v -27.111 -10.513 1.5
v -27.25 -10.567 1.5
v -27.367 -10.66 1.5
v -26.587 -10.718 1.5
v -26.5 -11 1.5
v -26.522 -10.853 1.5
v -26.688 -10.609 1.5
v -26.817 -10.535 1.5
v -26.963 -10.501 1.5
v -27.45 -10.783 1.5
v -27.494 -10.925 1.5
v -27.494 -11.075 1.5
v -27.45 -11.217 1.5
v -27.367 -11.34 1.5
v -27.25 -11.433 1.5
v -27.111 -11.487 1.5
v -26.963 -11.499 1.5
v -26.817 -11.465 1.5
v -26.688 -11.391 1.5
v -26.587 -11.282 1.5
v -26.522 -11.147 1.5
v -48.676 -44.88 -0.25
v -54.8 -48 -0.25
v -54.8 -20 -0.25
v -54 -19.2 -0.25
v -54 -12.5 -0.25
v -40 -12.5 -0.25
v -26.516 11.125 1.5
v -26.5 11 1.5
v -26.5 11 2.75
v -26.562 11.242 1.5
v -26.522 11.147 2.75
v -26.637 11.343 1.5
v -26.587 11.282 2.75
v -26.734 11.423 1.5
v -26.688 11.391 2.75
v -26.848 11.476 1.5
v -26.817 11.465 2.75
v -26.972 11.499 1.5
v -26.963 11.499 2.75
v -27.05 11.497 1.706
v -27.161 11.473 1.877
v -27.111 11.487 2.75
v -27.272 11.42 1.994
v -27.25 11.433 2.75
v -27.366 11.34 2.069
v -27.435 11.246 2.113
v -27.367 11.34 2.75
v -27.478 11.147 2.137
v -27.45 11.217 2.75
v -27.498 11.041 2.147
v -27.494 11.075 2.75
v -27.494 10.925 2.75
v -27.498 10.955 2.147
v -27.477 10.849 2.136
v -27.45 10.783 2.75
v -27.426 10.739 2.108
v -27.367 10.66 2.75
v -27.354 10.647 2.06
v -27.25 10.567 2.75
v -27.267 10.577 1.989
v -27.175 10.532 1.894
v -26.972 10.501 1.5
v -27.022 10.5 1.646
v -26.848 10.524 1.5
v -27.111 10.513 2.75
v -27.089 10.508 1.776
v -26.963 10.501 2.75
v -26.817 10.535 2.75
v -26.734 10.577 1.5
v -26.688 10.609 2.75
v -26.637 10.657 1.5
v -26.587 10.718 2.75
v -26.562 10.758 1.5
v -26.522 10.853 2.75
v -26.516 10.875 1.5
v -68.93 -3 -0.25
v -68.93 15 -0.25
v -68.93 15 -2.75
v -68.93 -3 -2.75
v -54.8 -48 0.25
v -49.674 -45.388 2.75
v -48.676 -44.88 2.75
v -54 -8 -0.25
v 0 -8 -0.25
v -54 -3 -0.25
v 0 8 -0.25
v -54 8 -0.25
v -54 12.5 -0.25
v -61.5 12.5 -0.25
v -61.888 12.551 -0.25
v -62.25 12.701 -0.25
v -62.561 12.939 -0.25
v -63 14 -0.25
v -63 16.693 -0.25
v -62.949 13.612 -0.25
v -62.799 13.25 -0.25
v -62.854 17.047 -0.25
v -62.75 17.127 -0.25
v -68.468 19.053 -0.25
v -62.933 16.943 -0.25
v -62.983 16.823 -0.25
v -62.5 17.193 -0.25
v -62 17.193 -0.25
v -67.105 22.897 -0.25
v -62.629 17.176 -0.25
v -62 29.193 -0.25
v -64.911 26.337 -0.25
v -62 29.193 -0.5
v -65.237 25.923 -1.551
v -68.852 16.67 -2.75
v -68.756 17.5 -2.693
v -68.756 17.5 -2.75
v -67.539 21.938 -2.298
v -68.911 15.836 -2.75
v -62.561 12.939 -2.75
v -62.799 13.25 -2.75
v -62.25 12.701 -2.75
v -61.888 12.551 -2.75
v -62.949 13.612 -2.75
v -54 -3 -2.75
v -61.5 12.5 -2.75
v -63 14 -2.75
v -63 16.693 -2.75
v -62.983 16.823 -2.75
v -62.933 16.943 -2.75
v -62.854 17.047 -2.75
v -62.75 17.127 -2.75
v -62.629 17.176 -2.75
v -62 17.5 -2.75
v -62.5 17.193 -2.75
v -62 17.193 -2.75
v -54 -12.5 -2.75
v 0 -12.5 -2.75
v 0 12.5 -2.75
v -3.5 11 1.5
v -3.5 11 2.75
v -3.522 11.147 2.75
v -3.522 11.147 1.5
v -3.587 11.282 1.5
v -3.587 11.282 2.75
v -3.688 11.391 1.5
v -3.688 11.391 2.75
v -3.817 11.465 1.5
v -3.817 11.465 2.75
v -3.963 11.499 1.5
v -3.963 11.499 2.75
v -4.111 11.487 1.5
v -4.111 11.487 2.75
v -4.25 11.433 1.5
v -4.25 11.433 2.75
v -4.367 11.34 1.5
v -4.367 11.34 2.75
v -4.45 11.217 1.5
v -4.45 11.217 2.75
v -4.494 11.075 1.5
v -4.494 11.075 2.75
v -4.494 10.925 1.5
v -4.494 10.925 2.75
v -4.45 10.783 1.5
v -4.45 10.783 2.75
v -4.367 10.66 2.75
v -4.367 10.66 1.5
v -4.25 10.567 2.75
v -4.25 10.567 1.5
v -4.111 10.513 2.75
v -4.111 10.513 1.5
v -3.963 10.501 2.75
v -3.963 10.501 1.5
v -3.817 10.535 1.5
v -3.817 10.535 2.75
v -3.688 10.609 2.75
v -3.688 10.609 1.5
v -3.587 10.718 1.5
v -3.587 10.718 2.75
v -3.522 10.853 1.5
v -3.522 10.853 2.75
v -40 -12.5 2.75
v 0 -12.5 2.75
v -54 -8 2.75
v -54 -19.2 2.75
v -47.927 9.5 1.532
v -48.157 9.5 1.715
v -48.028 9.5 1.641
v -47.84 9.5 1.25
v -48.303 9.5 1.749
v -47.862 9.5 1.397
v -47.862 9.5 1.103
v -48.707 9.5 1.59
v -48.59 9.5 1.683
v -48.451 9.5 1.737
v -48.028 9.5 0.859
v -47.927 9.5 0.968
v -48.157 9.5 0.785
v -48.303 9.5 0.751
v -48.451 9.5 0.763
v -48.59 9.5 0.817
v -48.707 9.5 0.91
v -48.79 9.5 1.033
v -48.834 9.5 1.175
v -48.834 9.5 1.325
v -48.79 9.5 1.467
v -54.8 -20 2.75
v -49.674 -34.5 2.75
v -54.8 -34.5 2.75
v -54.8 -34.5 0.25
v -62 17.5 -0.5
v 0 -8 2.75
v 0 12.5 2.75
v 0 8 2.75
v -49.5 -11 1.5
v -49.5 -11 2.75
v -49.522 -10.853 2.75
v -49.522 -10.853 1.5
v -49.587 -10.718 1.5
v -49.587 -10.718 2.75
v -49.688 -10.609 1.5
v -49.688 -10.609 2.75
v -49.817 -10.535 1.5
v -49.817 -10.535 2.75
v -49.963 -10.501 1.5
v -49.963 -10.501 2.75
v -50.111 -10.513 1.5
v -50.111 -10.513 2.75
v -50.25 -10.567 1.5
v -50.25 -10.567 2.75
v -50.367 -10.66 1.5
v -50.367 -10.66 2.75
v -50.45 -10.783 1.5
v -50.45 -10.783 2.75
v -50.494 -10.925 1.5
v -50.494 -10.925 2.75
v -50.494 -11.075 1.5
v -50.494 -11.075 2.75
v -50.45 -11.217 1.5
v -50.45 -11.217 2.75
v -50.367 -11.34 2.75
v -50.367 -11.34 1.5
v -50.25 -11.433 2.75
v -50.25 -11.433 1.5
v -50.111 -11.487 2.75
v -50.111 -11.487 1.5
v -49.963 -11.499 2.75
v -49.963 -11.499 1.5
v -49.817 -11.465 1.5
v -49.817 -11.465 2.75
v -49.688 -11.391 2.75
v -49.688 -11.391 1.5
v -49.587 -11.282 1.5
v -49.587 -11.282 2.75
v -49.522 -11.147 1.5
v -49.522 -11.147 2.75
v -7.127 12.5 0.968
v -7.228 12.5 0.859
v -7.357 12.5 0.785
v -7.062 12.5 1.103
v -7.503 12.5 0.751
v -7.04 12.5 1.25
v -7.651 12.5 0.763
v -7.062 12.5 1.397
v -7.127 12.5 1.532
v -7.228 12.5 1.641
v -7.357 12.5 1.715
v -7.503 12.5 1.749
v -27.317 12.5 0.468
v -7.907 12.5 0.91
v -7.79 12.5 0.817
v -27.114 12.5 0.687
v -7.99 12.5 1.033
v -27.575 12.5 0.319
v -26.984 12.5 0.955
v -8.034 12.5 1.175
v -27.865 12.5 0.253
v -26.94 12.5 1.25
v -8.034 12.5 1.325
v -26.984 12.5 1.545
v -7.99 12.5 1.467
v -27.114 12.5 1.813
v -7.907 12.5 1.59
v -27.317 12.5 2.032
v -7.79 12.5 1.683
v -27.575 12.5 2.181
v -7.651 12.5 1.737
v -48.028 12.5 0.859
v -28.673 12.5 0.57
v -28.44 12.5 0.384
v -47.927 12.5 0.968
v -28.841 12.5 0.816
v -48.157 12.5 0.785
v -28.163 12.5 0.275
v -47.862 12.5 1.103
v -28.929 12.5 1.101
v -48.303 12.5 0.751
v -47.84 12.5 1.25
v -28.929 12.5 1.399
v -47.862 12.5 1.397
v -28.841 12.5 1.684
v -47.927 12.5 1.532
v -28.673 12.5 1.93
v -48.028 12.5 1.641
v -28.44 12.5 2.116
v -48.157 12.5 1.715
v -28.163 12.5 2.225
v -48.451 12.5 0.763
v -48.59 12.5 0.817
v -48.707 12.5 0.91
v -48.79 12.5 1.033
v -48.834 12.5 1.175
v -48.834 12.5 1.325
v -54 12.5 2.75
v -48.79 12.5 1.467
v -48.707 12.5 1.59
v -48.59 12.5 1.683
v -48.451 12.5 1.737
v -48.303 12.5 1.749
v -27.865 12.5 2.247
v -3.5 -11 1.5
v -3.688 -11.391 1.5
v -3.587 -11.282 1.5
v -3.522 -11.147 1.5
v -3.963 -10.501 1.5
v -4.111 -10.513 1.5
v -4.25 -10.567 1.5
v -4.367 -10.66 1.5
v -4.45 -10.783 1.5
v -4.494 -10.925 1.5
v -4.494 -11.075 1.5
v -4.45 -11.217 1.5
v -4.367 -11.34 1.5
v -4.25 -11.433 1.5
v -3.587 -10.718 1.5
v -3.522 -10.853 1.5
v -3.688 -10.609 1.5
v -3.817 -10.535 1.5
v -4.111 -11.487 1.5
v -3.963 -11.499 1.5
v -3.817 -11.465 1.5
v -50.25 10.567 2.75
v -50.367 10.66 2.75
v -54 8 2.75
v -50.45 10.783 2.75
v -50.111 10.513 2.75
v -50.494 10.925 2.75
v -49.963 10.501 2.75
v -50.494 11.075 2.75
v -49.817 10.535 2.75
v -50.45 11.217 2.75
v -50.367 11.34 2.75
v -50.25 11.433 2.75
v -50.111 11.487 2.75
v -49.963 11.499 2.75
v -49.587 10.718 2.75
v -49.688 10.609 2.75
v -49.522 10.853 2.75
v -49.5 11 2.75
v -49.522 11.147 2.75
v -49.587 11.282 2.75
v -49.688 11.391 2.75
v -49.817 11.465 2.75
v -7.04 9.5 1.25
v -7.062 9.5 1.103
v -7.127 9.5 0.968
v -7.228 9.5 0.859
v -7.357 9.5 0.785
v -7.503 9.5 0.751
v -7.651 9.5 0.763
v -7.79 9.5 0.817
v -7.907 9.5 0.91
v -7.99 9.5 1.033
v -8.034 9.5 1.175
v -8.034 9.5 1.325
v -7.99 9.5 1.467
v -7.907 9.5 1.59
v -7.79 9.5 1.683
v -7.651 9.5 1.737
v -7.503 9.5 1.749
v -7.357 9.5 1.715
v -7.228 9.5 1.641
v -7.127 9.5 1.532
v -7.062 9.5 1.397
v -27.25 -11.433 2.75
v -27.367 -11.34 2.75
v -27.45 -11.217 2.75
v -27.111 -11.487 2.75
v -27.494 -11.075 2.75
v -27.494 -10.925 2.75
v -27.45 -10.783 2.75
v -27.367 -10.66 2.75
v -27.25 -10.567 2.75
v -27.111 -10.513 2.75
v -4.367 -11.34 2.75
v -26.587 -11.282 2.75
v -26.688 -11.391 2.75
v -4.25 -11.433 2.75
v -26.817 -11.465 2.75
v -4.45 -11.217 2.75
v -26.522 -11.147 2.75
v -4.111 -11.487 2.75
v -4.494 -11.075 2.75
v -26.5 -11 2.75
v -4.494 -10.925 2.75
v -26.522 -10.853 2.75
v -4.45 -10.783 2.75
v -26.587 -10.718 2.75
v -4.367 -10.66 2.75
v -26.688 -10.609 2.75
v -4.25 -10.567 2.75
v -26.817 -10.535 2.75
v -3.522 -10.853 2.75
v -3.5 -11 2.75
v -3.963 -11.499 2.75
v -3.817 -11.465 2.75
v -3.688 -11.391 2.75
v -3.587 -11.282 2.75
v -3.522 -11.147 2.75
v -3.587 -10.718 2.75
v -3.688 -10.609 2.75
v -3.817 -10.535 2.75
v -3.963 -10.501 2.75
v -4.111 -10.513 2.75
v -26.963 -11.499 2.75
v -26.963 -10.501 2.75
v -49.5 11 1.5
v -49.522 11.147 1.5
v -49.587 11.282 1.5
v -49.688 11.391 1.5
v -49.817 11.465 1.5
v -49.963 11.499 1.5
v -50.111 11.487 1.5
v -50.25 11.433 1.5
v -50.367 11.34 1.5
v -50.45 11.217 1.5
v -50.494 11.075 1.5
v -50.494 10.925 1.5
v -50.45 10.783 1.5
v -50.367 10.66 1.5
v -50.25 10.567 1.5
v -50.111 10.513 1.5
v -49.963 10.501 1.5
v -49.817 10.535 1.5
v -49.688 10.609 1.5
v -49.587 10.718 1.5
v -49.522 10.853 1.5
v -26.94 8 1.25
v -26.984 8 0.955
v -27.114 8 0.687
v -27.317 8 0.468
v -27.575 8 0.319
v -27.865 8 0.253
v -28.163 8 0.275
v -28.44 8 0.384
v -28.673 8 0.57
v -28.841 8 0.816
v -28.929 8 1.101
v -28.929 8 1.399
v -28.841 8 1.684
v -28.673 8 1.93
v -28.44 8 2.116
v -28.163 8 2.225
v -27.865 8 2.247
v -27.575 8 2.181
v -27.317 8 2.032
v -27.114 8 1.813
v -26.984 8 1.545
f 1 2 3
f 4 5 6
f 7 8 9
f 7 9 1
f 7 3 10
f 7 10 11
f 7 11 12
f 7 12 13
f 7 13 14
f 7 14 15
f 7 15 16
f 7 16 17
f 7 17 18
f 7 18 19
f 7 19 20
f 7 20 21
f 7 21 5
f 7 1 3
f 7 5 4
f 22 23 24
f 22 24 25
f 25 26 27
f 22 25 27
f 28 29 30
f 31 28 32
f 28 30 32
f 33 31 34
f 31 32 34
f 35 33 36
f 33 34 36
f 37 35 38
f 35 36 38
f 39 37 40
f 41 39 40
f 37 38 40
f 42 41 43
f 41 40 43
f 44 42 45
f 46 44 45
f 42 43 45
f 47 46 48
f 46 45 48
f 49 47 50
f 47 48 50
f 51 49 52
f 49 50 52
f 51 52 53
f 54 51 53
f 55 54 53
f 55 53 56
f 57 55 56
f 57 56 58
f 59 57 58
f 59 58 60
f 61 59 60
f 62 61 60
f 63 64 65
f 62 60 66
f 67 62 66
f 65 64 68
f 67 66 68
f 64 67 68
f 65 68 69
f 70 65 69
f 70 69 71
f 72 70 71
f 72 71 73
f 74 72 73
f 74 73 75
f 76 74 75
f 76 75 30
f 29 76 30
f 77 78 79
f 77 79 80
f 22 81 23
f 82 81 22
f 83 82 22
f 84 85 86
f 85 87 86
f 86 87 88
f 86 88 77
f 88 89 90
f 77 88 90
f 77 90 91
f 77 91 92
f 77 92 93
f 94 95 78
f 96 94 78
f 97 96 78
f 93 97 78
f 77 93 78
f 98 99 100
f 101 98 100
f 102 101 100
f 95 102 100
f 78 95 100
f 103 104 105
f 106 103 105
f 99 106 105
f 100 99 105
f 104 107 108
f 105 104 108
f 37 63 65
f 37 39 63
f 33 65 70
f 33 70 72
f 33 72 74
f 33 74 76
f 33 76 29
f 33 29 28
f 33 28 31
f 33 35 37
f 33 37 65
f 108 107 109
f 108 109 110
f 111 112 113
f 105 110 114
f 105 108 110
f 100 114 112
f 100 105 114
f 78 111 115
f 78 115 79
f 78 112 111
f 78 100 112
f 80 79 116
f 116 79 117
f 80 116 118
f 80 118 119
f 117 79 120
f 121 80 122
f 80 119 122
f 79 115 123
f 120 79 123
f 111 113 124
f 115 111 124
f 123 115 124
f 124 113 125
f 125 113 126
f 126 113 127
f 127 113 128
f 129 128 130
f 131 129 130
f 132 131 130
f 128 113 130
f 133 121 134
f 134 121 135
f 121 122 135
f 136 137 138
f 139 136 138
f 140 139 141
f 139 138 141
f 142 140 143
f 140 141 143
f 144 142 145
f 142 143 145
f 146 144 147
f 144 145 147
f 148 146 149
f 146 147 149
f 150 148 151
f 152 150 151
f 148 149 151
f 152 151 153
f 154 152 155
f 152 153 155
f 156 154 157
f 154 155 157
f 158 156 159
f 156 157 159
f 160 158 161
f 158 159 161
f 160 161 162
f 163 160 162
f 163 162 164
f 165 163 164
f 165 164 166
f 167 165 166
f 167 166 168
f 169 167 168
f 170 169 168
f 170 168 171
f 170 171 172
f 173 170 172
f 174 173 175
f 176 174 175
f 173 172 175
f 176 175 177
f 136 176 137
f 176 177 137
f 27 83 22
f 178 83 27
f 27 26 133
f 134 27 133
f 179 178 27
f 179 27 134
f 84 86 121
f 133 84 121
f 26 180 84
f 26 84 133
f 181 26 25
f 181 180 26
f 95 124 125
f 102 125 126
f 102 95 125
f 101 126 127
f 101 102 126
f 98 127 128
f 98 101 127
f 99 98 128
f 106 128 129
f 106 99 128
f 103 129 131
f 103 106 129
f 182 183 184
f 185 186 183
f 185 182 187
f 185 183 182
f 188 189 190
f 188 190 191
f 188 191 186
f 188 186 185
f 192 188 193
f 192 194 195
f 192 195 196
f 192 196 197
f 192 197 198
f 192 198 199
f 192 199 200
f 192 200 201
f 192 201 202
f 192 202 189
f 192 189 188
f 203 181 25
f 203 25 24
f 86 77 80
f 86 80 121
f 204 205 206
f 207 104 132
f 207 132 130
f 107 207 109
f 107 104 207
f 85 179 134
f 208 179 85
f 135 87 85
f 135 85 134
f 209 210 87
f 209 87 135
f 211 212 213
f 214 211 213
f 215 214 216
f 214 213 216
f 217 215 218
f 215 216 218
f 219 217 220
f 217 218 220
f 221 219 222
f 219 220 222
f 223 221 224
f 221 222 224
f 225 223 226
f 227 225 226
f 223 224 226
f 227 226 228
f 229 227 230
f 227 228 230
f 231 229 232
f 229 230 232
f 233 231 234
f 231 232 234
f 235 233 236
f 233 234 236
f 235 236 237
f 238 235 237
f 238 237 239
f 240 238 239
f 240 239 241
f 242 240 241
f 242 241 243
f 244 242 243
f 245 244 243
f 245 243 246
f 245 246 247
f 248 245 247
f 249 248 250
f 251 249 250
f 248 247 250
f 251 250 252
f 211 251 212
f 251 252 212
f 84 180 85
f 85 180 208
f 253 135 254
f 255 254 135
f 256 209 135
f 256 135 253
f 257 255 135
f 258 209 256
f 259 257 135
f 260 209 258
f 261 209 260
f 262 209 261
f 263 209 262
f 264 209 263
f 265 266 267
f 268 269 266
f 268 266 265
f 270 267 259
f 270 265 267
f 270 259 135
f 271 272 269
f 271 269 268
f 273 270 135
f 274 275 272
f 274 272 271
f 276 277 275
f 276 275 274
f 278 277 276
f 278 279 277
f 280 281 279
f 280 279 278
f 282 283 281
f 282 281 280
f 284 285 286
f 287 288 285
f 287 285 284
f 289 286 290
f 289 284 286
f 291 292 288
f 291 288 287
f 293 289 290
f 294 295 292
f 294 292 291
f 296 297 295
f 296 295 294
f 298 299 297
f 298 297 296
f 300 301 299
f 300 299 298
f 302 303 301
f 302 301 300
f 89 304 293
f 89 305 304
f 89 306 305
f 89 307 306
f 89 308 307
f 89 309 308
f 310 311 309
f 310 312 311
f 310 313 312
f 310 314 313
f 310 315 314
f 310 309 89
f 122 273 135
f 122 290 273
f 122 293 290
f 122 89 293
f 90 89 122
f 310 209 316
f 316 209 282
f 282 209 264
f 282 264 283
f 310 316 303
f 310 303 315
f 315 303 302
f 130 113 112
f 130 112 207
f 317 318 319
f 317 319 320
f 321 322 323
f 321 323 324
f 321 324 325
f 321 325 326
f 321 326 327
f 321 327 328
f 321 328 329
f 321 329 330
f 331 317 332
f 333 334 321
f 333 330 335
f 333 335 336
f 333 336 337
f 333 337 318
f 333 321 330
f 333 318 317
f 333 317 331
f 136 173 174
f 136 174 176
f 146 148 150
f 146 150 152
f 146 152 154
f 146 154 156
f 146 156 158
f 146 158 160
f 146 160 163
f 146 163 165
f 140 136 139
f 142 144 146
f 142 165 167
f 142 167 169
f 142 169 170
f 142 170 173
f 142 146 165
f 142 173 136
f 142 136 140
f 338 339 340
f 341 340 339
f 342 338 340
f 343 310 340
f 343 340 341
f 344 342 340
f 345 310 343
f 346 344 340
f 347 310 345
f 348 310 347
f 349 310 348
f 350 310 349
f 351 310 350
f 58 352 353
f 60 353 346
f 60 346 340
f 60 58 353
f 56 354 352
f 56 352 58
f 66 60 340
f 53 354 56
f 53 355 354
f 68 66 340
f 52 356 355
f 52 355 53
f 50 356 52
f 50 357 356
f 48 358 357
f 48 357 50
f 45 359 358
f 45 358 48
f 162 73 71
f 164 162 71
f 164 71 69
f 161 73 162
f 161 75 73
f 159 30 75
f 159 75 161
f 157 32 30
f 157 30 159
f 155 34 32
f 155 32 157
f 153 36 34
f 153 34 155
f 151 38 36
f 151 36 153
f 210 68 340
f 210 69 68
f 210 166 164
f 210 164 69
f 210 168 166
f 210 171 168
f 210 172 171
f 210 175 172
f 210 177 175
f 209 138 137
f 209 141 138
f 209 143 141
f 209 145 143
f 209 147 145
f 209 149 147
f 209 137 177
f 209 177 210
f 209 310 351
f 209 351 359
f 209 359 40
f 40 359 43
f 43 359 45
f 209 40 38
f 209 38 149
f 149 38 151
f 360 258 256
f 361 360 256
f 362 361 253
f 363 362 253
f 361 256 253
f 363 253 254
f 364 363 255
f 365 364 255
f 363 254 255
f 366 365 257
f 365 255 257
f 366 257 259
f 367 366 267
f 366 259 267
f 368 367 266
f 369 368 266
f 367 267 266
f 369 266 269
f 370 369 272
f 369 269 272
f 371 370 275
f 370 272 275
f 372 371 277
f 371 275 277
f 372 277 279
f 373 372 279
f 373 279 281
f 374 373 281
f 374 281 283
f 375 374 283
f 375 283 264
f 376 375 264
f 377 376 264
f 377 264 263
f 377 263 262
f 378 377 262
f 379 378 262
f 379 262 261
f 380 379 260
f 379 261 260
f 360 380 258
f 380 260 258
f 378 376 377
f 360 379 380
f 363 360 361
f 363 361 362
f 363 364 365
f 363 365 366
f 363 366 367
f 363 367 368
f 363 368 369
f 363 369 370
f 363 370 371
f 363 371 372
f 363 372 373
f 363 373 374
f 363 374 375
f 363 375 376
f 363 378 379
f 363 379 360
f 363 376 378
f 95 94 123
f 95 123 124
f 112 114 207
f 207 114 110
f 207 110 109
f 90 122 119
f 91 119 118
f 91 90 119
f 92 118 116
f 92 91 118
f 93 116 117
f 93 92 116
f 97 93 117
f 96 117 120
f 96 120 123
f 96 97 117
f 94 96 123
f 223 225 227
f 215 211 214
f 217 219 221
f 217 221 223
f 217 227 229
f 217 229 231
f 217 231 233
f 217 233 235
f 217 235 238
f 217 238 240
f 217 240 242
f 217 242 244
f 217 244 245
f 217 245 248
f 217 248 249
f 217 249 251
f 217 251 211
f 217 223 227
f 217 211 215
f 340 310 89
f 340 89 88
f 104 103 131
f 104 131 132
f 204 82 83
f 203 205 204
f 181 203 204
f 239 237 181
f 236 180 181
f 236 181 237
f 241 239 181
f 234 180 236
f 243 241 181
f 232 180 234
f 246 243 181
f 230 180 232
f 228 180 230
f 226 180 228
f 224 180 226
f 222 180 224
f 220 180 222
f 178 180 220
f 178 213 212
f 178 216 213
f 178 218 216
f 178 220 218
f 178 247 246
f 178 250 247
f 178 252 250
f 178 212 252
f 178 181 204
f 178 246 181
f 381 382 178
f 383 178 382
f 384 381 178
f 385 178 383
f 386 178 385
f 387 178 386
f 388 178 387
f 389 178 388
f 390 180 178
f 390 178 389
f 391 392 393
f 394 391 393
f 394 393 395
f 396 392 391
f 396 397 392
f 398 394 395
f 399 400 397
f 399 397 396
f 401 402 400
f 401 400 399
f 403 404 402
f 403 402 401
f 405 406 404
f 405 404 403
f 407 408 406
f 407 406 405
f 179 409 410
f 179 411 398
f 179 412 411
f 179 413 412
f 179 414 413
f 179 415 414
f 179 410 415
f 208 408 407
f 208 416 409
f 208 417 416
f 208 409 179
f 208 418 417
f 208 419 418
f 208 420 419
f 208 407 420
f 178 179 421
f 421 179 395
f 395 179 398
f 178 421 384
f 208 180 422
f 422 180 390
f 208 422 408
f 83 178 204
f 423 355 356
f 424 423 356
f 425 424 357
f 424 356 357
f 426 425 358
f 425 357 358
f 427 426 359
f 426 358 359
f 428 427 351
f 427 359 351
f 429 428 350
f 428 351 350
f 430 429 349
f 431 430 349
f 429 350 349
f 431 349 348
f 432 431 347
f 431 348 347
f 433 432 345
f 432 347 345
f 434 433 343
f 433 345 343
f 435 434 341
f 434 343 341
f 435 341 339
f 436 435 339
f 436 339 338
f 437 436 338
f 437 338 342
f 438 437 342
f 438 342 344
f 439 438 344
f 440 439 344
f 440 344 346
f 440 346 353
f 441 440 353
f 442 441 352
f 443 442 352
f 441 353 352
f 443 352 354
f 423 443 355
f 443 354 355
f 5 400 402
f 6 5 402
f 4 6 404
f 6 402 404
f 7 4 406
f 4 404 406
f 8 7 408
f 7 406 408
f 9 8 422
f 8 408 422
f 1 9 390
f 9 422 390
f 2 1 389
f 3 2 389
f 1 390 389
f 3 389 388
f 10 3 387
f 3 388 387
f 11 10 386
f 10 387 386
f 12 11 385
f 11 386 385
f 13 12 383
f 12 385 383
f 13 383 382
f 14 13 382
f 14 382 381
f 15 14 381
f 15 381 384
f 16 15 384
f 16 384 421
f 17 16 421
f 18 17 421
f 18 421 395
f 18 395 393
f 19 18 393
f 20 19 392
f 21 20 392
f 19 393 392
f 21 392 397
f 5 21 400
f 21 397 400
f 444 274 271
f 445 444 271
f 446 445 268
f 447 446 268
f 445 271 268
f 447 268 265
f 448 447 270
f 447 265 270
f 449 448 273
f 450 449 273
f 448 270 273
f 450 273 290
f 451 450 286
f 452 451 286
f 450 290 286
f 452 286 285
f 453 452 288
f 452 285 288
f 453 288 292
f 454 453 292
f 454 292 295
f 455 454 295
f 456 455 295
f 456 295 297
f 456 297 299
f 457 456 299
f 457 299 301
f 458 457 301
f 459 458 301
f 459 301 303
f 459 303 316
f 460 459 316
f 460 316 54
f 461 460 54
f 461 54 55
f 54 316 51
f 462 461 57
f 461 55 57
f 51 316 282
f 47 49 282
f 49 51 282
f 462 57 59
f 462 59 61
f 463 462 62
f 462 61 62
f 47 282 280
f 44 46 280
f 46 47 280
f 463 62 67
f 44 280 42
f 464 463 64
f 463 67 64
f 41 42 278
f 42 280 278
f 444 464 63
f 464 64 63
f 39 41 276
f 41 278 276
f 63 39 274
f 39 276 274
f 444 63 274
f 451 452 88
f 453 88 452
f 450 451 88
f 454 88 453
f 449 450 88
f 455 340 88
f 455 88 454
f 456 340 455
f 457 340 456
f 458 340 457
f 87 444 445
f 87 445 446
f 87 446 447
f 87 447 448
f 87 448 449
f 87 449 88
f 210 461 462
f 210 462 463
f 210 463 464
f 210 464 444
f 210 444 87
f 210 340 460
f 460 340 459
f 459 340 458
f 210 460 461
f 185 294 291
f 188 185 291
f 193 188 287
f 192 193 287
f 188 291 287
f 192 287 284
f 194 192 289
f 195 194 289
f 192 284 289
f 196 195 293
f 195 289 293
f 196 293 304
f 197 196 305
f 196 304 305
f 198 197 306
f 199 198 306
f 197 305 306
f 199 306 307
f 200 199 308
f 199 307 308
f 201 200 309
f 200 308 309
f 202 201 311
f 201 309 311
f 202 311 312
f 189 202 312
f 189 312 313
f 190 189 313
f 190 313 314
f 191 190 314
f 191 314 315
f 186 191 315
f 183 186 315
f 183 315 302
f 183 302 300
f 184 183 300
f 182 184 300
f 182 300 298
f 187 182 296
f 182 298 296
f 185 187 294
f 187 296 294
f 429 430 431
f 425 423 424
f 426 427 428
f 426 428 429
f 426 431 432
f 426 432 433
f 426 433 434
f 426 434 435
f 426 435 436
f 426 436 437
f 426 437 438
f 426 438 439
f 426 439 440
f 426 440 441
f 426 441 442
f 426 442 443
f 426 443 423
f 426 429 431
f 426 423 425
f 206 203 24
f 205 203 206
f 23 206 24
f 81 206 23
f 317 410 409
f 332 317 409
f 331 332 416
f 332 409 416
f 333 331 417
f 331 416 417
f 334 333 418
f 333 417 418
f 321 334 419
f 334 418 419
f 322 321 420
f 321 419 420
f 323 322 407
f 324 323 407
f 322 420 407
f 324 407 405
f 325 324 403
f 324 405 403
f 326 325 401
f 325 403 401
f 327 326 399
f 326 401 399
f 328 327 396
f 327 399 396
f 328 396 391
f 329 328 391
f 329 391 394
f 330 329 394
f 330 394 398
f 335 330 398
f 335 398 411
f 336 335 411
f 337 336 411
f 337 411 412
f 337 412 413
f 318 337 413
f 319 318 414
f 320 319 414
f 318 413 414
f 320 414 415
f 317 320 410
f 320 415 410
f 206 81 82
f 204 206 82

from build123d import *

# Parameters (mm, degrees)
BOSS_EXTRUDE1_DEPTH = 2.75
CUT_EXTRUDE1_DEPTH  = 3
SKETCH3_R           = 0.5
CUT_EXTRUDE2_DEPTH  = 1.25
CUT_EXTRUDE3_START  = 17.5
CUT_EXTRUDE3_DEPTH  = 12.5
SKETCH5_W           = 14.8
SKETCH5_H           = 2.5
CUT_EXTRUDE4_DEPTH  = 36.5
CUT_EXTRUDE5_START  = 35.5
CUT_EXTRUDE5_DEPTH  = 13.5
SKETCH7_R           = 0.5
CUT_EXTRUDE6_DEPTH  = 3
CUT_EXTRUDE7_REACH  = 62.5
SKETCH8_R           = 1


with BuildPart() as part:
    # Sketch1 → Boss-Extrude1 (new body, symmetric)
    with BuildSketch(Plane.XY):
        with BuildLine():
            Line((0, 0), (0, 12.5))
            Line((0, 12.5), (-61.5, 12.5))
            ThreePointArc((-61.5, 12.5), (-62.560660172, 12.939339828), (-63, 14))
            Line((-63, 14), (-63, 16.693487943))
            ThreePointArc((-63, 16.693487943), (-62.853553391, 17.047041334), (-62.5, 17.193487943))
            Line((-62.5, 17.193487943), (-62, 17.193487943))
            Line((-62, 17.193487943), (-62, 29.193487943))
            ThreePointArc((-62, 29.193487943), (-67.10498068, 22.897467949), (-68.93, 15))
            Line((-68.93, 15), (-68.93, -3))
            Line((-68.93, -3), (-54, -3))
            Line((-54, -3), (-54, -19.2))
            Line((-54, -19.2), (-54.8, -20))
            Line((-54.8, -20), (-54.8, -48))
            Line((-54.8, -48), (-48.67612206, -44.87972834))
            Line((-48.67612206, -44.87972834), (-40, -12.5))
            Line((-40, -12.5), (0, -12.5))
            Line((0, -12.5), (0, 0))
        make_face()
    extrude(amount=BOSS_EXTRUDE1_DEPTH, both=True)

    # Sketch2 → Cut-Extrude1 (cut)
    with BuildSketch(Plane.XY.offset(2.75)):
        Polygon((0, -8), (-54, -8), (-84.556927157, -8), (-84.556927157, 35.37162012), (-54, 35.37162012), (-54, 8), (0, 8), align=None)
    extrude(amount=-CUT_EXTRUDE1_DEPTH, mode=Mode.SUBTRACT)

    # Sketch3 → Cut-Extrude2 (cut)
    with BuildSketch(Plane.XY.offset(2.75)):
        with Locations((-4, 11)):
            Circle(SKETCH3_R)
        with Locations((-27, 11)):
            Circle(SKETCH3_R)
        with Locations((-50, 11)):
            Circle(SKETCH3_R)
        with Locations((-50, -11)):
            Circle(SKETCH3_R)
        with Locations((-27, -11)):
            Circle(SKETCH3_R)
        with Locations((-4, -11)):
            Circle(SKETCH3_R)
    extrude(amount=-CUT_EXTRUDE2_DEPTH, mode=Mode.SUBTRACT)

    # Sketch4 → Cut-Extrude3 (cut)
    with BuildSketch(Plane(origin=(0, 12.5, 0), x_dir=(1, 0, 0), z_dir=(0, 1, 0)).offset(CUT_EXTRUDE3_START)):
        Polygon((-68.93, 2.75), (-62, 0.5), (-62, 2.75), align=None)
    extrude(amount=-CUT_EXTRUDE3_DEPTH, mode=Mode.SUBTRACT)

    # Sketch5 → Cut-Extrude4 (cut, through all)
    with BuildSketch(Plane.XZ.offset(12.5)):
        with Locations((-47.4, -1.5)):
            Rectangle(SKETCH5_W, SKETCH5_H)
    extrude(amount=CUT_EXTRUDE4_DEPTH, mode=Mode.SUBTRACT)

    # Sketch6 → Cut-Extrude5 (cut)
    with BuildSketch(Plane.XZ.offset(12.5).offset(CUT_EXTRUDE5_START)):
        Polygon((-54.8, 2.75), (-54.8, 0.25), (-49.674240396, 2.75), align=None)
    extrude(amount=-CUT_EXTRUDE5_DEPTH, mode=Mode.SUBTRACT)

    # Sketch7 → Cut-Extrude6 (cut)
    with BuildSketch(Plane(origin=(0, 12.5, 0), x_dir=(1, 0, 0), z_dir=(0, 1, 0))):
        with Locations((-7.54, -1.25)):
            Circle(SKETCH7_R)
        with Locations((-48.34, -1.25)):
            Circle(SKETCH7_R)
    extrude(amount=-CUT_EXTRUDE6_DEPTH, mode=Mode.SUBTRACT)

    # Sketch8 → Cut-Extrude7 (cut, up to next)
    with BuildSketch(Plane(origin=(0, 12.5, 0), x_dir=(1, 0, 0), z_dir=(0, 1, 0)), mode=Mode.PRIVATE) as cut_extrude7_sk1:
        with Locations((-27.94, -1.25)):
            Circle(SKETCH8_R)
    cut_extrude7_tool1 = extrude(cut_extrude7_sk1.sketch, amount=-CUT_EXTRUDE7_REACH, mode=Mode.PRIVATE) & part.part
    add(cut_extrude7_tool1.solids().sort_by_distance((-27.94, 12.5, 1.25))[0], mode=Mode.SUBTRACT)


solid = part.part
